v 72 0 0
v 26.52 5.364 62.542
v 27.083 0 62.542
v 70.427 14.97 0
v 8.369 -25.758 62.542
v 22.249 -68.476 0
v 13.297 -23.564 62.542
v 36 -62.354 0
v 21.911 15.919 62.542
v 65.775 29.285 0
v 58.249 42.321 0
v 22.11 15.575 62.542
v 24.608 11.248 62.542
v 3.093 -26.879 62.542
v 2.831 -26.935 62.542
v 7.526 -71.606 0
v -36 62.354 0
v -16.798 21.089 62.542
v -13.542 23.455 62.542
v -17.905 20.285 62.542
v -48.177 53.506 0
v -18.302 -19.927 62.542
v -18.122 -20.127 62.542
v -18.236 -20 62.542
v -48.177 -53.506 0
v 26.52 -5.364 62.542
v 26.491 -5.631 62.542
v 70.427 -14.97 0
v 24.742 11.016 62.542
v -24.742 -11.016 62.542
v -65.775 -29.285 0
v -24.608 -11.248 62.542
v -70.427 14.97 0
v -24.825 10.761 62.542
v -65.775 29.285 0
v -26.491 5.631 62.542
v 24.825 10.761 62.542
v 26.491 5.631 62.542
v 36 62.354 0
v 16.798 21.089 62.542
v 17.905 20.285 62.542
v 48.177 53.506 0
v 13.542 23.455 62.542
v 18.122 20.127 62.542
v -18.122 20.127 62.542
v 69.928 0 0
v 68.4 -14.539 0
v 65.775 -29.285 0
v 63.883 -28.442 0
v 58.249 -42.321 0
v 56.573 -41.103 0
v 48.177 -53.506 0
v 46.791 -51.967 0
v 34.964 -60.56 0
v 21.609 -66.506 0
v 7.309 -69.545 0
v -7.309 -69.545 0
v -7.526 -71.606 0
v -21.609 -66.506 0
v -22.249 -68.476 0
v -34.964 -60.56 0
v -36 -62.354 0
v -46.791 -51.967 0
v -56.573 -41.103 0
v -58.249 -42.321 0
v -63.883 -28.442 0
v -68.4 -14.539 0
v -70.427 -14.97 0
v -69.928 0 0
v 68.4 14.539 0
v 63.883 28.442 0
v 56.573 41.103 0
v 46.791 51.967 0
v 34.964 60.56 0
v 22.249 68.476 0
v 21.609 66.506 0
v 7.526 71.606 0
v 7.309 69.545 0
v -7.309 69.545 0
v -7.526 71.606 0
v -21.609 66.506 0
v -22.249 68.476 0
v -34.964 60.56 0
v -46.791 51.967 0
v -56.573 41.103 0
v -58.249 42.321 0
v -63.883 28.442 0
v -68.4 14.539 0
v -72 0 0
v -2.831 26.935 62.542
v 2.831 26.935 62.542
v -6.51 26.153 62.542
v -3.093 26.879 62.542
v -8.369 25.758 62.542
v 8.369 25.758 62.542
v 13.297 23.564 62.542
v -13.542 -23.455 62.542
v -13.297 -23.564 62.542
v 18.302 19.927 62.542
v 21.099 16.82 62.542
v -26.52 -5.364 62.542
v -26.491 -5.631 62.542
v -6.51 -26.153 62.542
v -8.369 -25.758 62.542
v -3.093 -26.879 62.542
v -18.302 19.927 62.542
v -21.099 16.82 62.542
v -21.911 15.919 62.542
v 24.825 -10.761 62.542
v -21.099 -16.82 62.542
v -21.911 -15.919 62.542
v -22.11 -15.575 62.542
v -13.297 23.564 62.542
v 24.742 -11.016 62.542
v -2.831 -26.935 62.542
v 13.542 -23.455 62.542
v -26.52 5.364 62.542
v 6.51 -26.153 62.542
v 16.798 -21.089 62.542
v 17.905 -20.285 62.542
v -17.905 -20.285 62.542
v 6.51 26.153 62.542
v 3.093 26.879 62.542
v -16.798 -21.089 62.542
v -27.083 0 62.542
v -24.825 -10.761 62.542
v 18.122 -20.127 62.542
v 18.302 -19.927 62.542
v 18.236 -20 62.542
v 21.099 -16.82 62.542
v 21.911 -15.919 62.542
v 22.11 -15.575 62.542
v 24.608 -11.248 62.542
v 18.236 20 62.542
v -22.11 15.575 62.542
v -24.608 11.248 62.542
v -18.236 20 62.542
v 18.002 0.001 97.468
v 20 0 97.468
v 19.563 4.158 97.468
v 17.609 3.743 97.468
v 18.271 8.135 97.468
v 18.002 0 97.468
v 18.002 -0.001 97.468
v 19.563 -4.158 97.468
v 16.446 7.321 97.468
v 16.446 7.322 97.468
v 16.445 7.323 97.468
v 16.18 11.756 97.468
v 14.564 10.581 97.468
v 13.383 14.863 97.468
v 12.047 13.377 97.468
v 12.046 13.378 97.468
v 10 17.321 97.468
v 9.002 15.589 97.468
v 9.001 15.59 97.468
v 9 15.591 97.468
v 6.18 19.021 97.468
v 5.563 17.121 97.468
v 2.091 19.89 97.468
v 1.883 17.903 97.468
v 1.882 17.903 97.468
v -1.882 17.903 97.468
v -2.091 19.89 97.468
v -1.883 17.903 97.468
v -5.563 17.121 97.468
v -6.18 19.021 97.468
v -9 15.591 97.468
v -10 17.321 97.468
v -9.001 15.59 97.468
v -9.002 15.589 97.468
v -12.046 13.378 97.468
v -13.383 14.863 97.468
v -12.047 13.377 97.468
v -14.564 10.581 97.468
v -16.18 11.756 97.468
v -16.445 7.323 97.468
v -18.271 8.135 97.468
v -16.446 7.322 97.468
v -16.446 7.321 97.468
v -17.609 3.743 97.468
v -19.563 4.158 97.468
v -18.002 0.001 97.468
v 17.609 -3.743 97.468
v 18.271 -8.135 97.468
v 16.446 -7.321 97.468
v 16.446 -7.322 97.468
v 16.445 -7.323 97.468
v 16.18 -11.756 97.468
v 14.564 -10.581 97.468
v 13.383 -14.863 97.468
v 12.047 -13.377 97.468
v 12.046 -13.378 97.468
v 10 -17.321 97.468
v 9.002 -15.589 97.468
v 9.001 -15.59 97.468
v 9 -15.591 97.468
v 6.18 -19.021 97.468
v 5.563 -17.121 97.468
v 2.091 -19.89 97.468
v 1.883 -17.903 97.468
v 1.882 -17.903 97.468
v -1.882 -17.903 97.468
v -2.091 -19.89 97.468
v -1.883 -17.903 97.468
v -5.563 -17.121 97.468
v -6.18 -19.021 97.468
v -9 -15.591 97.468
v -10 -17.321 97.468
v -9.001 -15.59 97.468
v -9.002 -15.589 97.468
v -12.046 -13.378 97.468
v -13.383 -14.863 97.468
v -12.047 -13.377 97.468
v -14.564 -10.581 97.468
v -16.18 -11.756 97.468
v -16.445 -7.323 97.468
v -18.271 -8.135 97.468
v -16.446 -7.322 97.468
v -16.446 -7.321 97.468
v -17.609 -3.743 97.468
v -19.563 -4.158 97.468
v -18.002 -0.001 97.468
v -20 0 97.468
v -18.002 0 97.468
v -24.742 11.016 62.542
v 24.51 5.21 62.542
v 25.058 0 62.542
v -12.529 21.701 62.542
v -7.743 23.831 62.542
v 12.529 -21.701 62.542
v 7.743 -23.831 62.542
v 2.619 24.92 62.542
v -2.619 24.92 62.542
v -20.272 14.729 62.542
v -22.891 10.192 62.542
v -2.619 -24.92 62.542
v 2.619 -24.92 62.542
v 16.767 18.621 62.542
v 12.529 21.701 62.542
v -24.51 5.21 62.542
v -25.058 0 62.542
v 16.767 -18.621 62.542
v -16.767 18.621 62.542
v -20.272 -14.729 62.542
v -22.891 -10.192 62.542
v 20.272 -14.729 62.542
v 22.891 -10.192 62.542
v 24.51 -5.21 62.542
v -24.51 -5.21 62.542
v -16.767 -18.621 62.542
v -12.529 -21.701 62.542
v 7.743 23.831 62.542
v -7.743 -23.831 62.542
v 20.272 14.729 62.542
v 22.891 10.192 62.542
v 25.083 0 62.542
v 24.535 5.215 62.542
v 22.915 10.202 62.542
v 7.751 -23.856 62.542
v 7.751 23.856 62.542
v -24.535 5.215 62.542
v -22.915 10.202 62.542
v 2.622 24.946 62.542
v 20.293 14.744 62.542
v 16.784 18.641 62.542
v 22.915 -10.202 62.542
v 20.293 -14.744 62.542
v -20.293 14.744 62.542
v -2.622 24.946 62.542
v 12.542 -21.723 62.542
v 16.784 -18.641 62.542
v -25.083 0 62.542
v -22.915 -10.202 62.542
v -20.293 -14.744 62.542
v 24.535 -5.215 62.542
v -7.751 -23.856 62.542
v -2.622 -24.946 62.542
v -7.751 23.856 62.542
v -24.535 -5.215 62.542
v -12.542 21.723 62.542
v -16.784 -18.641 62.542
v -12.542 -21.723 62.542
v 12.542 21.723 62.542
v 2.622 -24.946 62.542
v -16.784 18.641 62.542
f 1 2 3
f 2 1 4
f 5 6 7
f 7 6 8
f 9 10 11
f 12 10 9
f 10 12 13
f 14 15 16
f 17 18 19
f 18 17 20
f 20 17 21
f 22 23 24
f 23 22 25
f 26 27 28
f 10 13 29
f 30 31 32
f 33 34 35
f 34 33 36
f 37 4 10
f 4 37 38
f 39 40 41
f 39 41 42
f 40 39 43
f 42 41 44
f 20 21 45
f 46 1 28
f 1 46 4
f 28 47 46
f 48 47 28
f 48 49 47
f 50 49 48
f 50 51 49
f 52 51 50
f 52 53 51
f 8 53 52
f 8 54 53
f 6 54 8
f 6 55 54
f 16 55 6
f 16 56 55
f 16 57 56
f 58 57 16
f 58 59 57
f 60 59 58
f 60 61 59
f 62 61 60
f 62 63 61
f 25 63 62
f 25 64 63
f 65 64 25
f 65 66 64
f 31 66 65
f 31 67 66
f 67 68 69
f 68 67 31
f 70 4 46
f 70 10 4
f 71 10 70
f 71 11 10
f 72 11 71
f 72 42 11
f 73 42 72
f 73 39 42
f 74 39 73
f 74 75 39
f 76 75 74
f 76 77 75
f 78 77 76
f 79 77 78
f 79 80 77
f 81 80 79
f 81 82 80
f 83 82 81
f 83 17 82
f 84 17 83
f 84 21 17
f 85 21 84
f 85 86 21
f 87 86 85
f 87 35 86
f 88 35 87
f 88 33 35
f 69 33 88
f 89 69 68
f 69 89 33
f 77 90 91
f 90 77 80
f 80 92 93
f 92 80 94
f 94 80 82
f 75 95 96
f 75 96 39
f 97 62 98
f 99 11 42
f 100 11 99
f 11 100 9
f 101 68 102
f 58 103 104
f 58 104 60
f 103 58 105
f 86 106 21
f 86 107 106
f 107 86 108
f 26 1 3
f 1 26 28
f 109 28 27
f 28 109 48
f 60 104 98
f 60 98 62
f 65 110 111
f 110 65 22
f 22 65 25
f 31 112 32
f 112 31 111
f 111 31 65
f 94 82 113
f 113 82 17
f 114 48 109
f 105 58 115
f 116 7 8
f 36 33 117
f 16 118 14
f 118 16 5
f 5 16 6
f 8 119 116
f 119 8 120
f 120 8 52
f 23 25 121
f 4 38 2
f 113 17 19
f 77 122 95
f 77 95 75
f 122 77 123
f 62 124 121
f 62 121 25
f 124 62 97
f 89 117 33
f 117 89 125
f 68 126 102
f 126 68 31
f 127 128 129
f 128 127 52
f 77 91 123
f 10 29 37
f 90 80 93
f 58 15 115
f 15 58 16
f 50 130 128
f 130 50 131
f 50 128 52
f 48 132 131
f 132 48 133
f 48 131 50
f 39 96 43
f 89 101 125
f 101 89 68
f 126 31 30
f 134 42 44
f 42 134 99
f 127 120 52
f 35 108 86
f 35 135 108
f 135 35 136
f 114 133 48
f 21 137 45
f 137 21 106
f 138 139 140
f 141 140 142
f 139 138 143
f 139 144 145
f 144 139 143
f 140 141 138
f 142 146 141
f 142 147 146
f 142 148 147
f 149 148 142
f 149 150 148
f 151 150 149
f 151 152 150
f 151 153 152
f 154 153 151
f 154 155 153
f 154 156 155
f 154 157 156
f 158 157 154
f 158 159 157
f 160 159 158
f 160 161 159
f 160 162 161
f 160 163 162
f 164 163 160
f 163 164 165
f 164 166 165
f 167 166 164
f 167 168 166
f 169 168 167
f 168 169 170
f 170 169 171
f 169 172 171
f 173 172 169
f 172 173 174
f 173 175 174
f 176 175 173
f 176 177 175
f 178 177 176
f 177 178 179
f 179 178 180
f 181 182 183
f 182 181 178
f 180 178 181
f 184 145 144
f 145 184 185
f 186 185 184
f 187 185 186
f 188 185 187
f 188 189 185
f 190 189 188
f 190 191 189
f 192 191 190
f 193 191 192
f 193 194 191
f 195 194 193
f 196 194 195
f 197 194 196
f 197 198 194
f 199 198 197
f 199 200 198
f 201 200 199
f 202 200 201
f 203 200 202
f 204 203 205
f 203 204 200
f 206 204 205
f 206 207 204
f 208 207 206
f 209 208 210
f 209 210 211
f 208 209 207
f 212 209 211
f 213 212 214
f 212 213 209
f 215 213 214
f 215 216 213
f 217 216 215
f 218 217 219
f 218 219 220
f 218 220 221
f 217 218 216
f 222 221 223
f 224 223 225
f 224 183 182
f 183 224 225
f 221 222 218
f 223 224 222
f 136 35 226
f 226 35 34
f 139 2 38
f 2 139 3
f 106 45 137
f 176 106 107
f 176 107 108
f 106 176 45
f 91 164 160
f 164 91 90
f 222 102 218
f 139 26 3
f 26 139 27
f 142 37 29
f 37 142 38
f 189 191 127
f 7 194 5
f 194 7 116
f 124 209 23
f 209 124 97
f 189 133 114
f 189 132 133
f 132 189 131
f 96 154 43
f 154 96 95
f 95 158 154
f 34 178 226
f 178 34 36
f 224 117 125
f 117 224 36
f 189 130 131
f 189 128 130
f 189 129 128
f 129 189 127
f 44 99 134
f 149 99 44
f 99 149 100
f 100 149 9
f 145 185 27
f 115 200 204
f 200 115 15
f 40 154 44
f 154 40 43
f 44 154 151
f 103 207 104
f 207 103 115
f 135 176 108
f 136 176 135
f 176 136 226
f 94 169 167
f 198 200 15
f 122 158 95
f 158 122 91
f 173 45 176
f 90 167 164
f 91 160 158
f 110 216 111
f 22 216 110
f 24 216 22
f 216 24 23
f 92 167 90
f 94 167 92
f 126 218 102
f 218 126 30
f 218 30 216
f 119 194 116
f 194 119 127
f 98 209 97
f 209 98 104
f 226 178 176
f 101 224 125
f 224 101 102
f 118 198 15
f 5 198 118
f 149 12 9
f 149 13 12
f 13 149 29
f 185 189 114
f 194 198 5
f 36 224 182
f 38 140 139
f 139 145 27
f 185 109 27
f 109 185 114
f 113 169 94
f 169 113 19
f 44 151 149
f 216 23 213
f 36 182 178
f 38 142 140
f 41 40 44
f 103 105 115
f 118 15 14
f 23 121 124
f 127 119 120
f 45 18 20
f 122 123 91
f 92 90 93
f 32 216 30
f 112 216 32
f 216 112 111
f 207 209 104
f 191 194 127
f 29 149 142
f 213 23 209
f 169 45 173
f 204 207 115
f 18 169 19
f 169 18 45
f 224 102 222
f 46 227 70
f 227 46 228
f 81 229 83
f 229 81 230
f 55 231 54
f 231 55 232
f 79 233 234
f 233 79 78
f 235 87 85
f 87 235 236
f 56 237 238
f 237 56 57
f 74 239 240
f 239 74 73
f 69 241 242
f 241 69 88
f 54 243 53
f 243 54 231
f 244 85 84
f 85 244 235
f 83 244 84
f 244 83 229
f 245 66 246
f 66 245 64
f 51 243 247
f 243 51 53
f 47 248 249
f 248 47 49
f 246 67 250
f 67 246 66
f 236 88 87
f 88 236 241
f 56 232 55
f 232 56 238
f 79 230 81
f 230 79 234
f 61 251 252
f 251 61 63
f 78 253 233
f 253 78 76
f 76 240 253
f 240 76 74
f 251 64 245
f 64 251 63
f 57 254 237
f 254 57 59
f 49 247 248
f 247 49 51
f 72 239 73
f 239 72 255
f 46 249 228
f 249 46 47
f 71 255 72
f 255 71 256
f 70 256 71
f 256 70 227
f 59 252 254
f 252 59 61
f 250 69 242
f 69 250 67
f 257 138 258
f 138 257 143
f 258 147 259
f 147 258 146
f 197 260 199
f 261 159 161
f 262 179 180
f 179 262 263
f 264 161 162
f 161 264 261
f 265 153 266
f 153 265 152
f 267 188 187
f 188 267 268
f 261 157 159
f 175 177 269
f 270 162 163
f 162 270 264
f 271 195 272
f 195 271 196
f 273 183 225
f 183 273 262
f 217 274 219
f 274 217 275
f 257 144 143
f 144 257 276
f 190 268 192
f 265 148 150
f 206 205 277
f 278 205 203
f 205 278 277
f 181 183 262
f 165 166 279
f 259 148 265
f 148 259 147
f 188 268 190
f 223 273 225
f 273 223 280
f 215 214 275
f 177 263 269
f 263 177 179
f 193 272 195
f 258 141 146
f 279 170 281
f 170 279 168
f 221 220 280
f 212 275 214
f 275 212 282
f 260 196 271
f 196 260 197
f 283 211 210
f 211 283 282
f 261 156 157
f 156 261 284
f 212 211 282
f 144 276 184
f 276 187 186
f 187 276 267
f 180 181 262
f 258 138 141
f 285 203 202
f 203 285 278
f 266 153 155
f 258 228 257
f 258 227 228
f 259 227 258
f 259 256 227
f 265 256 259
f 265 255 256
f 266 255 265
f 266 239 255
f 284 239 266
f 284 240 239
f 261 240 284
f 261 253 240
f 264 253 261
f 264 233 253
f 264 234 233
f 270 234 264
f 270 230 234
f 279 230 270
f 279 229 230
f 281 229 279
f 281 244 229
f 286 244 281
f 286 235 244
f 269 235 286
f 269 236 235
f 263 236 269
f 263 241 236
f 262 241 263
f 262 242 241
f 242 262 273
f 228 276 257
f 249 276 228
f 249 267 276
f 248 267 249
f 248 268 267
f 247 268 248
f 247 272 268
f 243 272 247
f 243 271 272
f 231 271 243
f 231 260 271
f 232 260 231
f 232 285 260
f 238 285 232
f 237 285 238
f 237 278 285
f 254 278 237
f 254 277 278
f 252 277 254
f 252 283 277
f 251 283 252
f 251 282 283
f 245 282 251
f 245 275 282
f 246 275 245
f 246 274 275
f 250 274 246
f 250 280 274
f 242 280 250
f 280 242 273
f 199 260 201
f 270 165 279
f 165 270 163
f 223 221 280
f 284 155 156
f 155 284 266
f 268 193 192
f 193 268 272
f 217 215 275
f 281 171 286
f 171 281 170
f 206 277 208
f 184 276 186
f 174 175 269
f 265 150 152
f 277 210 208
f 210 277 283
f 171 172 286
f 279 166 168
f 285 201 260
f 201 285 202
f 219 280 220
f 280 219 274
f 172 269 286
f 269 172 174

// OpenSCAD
/*

* should 

*/


//todo: bonus X000 micron (X mm) filter for big chunks

//measurements
cone_folded_arc_angle = 105;
cone_slant_h = 120;
filter_slant_h = 43;

//design parameters
thin_wall_thickness = 2;
pour_hole_d = 44;
pour_hole_margin = 4;

//shorthand
twt=thin_wall_thickness;

//calculated
cone_arc_angle = 2 * cone_folded_arc_angle;
cone_arc_length = 2 * PI * cone_arc_angle / 360 * cone_slant_h;
cone_r = (1/(2*PI)) * cone_arc_length;
cone_h = sqrt(cone_slant_h^2 - cone_r^2);
//cone_slope = cone_h/cone_r;

filter_h = filter_slant_h * (cone_h / cone_slant_h);
filter_r = filter_h * (cone_r / cone_h);

filter_r_safe = min(filter_r, .5 * pour_hole_d - pour_hole_margin);

//todo
module cap(){
	//from https://www.printables.com/model/215011-soda-bottle-funnel-cap-for-siraya-tech-resin-1-kg/files
	// if substituting your own,
	// position it so that the imaginary lip of the bottle
  // is	on the xy plane and centered around the z axis
	x_min=-13.59;
	y_min=-7.58;
	z_min=-.175;
	d = 54.53;
	if($preview){
		difference(){
			translate([0,0,-19]) cylinder(h=21,d=d);
			mirror([0,0,1]) cylinder(h=20,d=d-8);
		}
	} else {
		rotate([90,0,0]) translate([x_min-.5*d,y_min,z_min-.5*d]) import("basic_cap.stl");
	}
	

}


module decorative_web(h,r, count, angle, thickness,center=false){
	intersection(){
		#cylinder(h=h,r=r,center=center);
		
		union() for(i=[0:count-1]){
			theta=360*i/count;
			translate([0,0, center ? 0: h/2])
				rotate([0,angle,theta])
					cube([thickness, 2*h+4*r,2*h+4*r], center=true);
		}
	}
}

module funnel(){
	 difference(){
		union(){
			//fat part
			cylinder(h=cone_h, r1=cone_r+twt,r2=twt);
			//skinny part
			translate([0,0,cone_h-filter_h])
				cylinder(h=filter_h,r1=filter_r+twt, r2=filter_r_safe+twt);
		}
		//fat negative
		translate([0,0,-.1]) cylinder(h=cone_h+.1, r1=cone_r,r2=0);
		//skinny negative
			translate([0,0,cone_h-filter_h])
				cylinder(h=filter_h+.01,r1=filter_r, r2=filter_r_safe);
		
		///translate([0,0,cone_h-filter_h]) cylinder(h=filter_h,r=filter_r_safe);
	}
	//%translate([0,0,cone_h-filter_h]) cylinder(h=filter_h,r=filter_r);
}
module main(){
	translate([0,0,cone_h]) mirror([0,0,1]) funnel();
	difference(){
		cap();
		cylinder(d=pour_hole_d,h=99, center=true);
	}

}

funnel();

//decorative_web(100,40,10,40,3);
